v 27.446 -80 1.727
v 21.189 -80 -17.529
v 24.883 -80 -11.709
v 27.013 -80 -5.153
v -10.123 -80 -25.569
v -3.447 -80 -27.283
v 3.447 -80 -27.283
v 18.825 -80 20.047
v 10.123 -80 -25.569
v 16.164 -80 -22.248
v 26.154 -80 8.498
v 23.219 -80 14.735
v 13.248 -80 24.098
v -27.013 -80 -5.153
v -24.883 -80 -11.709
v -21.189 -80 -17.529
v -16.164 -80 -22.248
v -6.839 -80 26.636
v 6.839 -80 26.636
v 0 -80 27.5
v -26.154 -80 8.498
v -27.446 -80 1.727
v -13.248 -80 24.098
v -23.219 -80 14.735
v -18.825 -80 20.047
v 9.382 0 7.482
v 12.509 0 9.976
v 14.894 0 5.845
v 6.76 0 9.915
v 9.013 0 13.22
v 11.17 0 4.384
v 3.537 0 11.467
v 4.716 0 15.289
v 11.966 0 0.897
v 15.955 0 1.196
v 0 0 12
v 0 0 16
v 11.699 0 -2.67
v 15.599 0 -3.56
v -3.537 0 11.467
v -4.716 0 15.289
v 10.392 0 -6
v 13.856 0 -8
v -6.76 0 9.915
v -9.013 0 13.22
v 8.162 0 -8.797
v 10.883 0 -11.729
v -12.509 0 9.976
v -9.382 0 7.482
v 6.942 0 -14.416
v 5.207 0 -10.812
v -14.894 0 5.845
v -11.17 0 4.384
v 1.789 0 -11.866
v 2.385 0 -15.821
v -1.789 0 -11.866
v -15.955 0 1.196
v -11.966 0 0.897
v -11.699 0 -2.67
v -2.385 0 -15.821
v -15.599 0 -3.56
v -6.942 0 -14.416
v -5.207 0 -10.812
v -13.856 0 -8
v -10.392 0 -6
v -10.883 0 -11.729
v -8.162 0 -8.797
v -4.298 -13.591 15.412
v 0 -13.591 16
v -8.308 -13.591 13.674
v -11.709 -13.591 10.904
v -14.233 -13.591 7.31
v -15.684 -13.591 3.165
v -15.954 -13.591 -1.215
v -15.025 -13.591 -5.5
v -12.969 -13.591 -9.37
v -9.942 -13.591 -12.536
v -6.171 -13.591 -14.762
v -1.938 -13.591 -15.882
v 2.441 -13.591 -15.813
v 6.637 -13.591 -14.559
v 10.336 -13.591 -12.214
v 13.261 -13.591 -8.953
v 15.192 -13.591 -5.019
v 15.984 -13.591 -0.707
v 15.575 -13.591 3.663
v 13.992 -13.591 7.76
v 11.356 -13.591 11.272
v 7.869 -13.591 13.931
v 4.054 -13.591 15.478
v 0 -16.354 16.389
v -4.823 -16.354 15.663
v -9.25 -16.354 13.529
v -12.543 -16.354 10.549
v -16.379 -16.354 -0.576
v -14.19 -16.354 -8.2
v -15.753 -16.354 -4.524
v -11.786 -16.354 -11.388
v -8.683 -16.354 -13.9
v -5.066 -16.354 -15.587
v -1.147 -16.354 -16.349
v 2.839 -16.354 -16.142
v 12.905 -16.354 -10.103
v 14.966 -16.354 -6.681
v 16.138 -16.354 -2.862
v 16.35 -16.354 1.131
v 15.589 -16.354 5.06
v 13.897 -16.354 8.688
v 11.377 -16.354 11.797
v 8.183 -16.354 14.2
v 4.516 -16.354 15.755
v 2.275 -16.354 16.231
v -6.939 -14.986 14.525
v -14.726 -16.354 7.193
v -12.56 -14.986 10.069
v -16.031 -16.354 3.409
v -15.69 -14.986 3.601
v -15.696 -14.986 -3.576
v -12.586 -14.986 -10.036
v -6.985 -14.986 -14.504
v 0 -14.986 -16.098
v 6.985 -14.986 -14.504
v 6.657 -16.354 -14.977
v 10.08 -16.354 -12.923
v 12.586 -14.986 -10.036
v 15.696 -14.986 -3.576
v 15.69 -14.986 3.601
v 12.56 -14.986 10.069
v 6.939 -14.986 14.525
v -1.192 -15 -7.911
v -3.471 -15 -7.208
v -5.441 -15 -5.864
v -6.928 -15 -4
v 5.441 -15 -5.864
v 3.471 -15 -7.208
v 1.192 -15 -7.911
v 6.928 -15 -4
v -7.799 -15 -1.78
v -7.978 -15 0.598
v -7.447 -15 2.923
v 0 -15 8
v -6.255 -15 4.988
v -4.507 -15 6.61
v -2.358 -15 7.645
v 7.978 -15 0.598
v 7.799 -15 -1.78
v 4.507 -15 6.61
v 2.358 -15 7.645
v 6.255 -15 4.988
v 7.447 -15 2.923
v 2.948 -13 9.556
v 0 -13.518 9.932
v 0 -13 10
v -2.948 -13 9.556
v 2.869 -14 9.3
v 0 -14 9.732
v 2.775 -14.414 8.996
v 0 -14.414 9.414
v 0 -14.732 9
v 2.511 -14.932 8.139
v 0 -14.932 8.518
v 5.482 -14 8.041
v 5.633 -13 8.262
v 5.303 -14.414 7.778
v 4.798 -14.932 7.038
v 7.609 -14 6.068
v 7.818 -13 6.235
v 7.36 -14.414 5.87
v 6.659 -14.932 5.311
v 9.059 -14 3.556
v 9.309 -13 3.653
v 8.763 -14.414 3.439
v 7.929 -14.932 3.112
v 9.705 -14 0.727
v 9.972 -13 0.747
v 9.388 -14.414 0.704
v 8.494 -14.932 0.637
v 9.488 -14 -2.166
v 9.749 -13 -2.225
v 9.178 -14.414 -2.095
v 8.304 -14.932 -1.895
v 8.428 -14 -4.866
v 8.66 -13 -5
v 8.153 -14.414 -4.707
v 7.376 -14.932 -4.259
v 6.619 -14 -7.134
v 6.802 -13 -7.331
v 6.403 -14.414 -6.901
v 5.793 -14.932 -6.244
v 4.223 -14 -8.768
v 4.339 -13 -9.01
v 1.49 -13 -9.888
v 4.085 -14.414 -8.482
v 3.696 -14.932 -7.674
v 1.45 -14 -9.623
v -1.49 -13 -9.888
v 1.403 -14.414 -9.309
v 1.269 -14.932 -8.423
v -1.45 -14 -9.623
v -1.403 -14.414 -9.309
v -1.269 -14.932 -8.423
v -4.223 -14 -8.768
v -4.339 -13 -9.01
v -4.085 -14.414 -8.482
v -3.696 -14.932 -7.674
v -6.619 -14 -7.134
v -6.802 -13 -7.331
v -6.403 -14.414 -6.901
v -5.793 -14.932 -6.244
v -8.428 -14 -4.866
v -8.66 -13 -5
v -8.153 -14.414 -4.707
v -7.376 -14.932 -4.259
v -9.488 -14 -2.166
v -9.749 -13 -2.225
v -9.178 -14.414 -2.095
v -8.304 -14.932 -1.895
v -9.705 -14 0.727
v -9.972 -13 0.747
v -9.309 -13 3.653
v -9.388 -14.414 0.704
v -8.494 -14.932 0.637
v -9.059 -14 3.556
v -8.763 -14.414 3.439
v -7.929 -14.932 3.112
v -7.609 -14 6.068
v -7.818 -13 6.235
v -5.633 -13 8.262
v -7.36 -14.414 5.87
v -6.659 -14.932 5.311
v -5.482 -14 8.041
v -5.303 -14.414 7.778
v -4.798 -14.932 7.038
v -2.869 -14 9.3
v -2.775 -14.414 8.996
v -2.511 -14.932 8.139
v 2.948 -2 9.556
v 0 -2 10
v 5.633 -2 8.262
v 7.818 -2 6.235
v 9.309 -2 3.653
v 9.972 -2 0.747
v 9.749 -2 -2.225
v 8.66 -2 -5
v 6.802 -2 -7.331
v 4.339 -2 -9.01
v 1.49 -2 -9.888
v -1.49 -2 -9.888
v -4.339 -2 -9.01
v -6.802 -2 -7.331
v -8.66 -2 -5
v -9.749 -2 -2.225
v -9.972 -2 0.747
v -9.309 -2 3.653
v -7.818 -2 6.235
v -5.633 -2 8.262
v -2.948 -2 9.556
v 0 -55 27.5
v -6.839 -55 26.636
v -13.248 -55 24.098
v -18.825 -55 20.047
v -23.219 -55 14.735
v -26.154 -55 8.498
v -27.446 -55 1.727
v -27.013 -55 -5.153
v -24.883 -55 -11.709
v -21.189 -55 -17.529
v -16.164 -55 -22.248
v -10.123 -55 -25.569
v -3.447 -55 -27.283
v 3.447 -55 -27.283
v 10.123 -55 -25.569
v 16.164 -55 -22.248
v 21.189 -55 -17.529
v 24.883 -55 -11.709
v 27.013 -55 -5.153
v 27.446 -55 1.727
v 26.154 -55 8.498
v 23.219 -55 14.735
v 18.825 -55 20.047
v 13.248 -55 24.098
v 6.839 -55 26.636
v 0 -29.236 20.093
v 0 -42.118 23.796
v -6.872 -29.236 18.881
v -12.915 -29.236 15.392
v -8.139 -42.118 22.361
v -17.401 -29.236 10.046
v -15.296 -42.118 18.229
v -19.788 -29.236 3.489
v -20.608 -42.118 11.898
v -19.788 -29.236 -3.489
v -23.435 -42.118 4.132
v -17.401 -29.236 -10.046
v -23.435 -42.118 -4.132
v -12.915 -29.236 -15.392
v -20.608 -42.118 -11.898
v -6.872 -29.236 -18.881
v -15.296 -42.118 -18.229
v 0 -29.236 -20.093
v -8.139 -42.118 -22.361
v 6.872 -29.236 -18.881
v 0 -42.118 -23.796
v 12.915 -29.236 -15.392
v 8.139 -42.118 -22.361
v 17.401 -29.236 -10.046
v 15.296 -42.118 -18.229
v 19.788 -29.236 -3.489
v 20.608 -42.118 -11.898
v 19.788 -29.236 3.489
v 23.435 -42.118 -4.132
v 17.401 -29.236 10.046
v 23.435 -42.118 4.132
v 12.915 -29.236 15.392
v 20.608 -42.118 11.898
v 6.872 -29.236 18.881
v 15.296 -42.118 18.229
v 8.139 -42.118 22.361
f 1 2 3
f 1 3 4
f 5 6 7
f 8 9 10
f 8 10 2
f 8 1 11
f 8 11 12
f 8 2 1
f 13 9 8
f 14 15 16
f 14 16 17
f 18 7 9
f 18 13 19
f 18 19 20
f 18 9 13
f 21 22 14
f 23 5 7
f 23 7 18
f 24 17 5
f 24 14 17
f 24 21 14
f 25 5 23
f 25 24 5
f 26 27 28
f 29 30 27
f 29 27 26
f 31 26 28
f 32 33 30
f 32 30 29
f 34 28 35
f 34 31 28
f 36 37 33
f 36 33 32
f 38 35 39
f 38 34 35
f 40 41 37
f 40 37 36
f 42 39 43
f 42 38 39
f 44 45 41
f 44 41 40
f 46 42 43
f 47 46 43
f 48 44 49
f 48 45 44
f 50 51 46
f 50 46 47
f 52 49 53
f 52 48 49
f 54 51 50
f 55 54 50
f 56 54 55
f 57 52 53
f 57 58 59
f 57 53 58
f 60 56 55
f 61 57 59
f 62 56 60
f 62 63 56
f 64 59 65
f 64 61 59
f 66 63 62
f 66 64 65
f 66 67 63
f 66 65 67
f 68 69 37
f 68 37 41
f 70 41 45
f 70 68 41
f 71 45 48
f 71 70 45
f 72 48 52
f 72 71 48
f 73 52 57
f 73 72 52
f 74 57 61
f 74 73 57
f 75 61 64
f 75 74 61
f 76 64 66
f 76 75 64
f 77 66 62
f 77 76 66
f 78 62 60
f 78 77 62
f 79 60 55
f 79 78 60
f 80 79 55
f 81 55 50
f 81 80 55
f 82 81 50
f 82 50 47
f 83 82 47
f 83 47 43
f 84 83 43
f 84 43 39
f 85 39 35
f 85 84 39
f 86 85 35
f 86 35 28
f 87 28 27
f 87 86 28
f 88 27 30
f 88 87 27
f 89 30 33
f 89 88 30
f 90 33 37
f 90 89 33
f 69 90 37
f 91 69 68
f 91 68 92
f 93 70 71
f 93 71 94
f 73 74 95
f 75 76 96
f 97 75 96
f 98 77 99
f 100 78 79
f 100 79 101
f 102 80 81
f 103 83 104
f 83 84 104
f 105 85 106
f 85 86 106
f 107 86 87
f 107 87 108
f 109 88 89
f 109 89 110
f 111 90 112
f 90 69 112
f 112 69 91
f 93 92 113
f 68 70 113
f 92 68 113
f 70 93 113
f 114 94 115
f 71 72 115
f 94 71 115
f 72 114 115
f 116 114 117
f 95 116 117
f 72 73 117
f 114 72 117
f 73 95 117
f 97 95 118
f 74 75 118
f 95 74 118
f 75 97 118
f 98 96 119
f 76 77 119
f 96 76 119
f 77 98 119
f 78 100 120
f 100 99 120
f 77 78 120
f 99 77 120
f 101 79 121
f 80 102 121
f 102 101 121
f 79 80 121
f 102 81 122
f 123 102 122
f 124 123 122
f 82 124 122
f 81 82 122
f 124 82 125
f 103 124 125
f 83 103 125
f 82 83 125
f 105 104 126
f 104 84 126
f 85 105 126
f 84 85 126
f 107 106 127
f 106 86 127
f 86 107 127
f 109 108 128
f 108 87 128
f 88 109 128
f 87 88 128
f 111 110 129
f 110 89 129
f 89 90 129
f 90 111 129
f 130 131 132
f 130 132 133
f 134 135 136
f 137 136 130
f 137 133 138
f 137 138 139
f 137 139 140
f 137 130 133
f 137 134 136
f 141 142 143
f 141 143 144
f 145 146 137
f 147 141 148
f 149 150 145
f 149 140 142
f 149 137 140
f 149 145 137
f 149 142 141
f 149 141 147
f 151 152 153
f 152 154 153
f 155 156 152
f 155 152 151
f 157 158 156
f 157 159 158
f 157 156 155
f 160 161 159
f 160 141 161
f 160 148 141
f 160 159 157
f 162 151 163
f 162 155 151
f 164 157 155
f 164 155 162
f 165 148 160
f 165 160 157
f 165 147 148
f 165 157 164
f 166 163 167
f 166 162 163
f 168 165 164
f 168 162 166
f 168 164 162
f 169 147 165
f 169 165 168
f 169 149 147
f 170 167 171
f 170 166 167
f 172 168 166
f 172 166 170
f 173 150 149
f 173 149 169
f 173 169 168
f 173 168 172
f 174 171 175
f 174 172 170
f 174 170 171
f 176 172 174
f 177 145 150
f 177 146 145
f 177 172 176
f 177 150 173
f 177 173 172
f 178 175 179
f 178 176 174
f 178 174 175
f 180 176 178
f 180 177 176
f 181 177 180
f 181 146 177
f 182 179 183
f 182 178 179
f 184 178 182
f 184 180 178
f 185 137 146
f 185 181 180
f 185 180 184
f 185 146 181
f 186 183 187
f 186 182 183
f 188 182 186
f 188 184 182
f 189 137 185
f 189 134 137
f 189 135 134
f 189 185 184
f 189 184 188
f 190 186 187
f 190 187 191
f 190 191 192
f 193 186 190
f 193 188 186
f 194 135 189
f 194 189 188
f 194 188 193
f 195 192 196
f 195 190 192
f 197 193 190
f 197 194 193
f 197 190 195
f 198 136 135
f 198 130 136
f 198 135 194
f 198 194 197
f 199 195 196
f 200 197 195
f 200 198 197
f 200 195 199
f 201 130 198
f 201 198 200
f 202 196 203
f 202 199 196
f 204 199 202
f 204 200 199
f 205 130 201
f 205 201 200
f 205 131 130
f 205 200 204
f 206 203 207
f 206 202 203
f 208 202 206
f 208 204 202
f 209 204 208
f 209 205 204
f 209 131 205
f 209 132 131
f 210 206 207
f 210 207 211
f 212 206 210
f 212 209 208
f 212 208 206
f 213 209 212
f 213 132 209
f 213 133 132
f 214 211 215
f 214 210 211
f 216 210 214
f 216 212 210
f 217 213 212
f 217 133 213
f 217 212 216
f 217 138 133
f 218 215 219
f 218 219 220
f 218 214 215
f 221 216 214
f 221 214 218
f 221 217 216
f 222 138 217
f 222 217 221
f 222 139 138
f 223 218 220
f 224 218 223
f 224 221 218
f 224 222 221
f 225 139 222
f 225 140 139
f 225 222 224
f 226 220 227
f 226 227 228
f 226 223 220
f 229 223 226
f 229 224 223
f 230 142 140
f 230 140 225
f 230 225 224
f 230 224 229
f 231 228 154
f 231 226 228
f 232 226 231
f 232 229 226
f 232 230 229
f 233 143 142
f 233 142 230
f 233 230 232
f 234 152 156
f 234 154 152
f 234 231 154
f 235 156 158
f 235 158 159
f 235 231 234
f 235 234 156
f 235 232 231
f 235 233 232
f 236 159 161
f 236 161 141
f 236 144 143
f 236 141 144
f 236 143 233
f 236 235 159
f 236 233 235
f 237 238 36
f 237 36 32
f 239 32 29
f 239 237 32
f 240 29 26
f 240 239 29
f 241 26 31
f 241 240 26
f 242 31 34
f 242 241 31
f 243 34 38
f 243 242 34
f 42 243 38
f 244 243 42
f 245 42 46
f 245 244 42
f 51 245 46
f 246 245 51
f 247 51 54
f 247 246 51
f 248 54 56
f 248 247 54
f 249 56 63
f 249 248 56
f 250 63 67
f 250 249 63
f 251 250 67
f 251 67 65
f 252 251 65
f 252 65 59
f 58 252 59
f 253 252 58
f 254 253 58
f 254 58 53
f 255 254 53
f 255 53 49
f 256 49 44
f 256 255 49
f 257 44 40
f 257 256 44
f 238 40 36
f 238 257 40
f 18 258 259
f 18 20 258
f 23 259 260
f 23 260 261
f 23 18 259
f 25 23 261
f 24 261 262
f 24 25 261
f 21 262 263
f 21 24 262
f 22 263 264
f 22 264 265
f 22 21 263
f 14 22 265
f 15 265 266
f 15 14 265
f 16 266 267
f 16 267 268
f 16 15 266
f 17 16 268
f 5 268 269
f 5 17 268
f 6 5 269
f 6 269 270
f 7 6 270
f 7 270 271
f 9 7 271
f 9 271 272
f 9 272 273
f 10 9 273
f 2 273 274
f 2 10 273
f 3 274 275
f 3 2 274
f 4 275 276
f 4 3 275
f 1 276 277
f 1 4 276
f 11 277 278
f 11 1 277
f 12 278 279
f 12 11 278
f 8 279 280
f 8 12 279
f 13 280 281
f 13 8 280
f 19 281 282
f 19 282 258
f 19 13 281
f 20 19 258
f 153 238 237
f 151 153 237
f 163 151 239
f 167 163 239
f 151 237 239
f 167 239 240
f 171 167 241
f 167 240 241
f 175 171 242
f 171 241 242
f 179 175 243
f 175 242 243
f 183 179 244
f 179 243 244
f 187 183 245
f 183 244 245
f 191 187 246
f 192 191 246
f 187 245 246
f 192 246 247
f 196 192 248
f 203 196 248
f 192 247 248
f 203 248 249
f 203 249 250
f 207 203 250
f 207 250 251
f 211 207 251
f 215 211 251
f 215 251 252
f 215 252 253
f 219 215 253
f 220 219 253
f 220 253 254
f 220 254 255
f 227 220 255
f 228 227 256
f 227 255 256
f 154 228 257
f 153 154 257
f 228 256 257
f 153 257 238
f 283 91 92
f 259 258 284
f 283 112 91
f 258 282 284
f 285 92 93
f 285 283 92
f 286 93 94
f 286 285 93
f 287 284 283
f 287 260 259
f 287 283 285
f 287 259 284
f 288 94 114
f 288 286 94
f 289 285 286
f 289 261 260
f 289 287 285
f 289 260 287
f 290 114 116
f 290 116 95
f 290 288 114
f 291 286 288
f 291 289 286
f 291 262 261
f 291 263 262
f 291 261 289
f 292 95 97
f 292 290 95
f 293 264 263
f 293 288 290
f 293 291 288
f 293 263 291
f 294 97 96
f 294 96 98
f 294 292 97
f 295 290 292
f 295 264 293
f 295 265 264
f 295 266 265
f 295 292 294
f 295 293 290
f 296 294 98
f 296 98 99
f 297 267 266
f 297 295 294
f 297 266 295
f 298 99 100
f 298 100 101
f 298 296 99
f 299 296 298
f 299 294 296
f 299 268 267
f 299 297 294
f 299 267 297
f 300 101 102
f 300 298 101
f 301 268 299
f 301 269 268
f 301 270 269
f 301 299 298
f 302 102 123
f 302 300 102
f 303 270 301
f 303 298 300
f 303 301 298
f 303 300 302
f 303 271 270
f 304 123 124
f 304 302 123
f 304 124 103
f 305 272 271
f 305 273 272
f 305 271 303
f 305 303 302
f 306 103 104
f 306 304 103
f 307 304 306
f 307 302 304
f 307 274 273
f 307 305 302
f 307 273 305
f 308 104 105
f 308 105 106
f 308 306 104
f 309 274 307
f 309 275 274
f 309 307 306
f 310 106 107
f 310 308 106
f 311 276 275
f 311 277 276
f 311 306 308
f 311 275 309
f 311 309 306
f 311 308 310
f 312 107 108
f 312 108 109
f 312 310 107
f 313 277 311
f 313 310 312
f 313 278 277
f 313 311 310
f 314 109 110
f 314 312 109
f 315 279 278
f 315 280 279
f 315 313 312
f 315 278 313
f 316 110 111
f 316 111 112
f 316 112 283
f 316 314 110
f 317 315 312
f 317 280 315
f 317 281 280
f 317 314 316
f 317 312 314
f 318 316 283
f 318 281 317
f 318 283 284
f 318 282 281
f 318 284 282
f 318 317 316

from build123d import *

# Parameters (mm, degrees)
SKETCH_2_R          = 10
CUT_EXTRUDE_1_DEPTH = 15
CHAMFER_1_SIZE      = 2
FILLET_1_R          = 2
FILLET_2_R          = 10


with BuildPart() as part:
    # 草图1 → 旋转1 (revolve)
    with BuildSketch(Plane.XY, mode=Mode.PRIVATE) as revolve_1_sk:
        Polygon((0, 0), (16, 0), (16, -15), (27.5, -55), (27.5, -80), (0, -80), align=None)
    revolve(revolve_1_sk.sketch.rotate(Axis((0, 36.444043321, 0), (0, -1, 0)), 90), axis=Axis((0, 36.444043321, 0), (0, -1, 0)))

    # 草图2 → 切除-拉伸1 (cut)
    with BuildSketch(Plane(origin=(0, 0, 0), x_dir=(1, 0, 0), z_dir=(0, 1, 0))):
        with Locations(Location((0, 0, 0), (0, 0, 270))):
            Circle(SKETCH_2_R)
    extrude(amount=-CUT_EXTRUDE_1_DEPTH, mode=Mode.SUBTRACT)

    # 倒角1
    chamfer_1_edges = [part.edges().sort_by_distance(p)[0] for p in [
        (0, 0, -10),
    ]]
    chamfer(chamfer_1_edges, length=CHAMFER_1_SIZE)

    # 圆角1
    fillet_1_edges = [part.edges().sort_by_distance(p)[0] for p in [
        (0, -15, -10),
    ]]
    fillet(fillet_1_edges, radius=FILLET_1_R)

    # 圆角2
    fillet_2_edges = [part.edges().sort_by_distance(p)[0] for p in [
        (0, -15, -16),
    ]]
    fillet(fillet_2_edges, radius=FILLET_2_R)


solid = part.part
